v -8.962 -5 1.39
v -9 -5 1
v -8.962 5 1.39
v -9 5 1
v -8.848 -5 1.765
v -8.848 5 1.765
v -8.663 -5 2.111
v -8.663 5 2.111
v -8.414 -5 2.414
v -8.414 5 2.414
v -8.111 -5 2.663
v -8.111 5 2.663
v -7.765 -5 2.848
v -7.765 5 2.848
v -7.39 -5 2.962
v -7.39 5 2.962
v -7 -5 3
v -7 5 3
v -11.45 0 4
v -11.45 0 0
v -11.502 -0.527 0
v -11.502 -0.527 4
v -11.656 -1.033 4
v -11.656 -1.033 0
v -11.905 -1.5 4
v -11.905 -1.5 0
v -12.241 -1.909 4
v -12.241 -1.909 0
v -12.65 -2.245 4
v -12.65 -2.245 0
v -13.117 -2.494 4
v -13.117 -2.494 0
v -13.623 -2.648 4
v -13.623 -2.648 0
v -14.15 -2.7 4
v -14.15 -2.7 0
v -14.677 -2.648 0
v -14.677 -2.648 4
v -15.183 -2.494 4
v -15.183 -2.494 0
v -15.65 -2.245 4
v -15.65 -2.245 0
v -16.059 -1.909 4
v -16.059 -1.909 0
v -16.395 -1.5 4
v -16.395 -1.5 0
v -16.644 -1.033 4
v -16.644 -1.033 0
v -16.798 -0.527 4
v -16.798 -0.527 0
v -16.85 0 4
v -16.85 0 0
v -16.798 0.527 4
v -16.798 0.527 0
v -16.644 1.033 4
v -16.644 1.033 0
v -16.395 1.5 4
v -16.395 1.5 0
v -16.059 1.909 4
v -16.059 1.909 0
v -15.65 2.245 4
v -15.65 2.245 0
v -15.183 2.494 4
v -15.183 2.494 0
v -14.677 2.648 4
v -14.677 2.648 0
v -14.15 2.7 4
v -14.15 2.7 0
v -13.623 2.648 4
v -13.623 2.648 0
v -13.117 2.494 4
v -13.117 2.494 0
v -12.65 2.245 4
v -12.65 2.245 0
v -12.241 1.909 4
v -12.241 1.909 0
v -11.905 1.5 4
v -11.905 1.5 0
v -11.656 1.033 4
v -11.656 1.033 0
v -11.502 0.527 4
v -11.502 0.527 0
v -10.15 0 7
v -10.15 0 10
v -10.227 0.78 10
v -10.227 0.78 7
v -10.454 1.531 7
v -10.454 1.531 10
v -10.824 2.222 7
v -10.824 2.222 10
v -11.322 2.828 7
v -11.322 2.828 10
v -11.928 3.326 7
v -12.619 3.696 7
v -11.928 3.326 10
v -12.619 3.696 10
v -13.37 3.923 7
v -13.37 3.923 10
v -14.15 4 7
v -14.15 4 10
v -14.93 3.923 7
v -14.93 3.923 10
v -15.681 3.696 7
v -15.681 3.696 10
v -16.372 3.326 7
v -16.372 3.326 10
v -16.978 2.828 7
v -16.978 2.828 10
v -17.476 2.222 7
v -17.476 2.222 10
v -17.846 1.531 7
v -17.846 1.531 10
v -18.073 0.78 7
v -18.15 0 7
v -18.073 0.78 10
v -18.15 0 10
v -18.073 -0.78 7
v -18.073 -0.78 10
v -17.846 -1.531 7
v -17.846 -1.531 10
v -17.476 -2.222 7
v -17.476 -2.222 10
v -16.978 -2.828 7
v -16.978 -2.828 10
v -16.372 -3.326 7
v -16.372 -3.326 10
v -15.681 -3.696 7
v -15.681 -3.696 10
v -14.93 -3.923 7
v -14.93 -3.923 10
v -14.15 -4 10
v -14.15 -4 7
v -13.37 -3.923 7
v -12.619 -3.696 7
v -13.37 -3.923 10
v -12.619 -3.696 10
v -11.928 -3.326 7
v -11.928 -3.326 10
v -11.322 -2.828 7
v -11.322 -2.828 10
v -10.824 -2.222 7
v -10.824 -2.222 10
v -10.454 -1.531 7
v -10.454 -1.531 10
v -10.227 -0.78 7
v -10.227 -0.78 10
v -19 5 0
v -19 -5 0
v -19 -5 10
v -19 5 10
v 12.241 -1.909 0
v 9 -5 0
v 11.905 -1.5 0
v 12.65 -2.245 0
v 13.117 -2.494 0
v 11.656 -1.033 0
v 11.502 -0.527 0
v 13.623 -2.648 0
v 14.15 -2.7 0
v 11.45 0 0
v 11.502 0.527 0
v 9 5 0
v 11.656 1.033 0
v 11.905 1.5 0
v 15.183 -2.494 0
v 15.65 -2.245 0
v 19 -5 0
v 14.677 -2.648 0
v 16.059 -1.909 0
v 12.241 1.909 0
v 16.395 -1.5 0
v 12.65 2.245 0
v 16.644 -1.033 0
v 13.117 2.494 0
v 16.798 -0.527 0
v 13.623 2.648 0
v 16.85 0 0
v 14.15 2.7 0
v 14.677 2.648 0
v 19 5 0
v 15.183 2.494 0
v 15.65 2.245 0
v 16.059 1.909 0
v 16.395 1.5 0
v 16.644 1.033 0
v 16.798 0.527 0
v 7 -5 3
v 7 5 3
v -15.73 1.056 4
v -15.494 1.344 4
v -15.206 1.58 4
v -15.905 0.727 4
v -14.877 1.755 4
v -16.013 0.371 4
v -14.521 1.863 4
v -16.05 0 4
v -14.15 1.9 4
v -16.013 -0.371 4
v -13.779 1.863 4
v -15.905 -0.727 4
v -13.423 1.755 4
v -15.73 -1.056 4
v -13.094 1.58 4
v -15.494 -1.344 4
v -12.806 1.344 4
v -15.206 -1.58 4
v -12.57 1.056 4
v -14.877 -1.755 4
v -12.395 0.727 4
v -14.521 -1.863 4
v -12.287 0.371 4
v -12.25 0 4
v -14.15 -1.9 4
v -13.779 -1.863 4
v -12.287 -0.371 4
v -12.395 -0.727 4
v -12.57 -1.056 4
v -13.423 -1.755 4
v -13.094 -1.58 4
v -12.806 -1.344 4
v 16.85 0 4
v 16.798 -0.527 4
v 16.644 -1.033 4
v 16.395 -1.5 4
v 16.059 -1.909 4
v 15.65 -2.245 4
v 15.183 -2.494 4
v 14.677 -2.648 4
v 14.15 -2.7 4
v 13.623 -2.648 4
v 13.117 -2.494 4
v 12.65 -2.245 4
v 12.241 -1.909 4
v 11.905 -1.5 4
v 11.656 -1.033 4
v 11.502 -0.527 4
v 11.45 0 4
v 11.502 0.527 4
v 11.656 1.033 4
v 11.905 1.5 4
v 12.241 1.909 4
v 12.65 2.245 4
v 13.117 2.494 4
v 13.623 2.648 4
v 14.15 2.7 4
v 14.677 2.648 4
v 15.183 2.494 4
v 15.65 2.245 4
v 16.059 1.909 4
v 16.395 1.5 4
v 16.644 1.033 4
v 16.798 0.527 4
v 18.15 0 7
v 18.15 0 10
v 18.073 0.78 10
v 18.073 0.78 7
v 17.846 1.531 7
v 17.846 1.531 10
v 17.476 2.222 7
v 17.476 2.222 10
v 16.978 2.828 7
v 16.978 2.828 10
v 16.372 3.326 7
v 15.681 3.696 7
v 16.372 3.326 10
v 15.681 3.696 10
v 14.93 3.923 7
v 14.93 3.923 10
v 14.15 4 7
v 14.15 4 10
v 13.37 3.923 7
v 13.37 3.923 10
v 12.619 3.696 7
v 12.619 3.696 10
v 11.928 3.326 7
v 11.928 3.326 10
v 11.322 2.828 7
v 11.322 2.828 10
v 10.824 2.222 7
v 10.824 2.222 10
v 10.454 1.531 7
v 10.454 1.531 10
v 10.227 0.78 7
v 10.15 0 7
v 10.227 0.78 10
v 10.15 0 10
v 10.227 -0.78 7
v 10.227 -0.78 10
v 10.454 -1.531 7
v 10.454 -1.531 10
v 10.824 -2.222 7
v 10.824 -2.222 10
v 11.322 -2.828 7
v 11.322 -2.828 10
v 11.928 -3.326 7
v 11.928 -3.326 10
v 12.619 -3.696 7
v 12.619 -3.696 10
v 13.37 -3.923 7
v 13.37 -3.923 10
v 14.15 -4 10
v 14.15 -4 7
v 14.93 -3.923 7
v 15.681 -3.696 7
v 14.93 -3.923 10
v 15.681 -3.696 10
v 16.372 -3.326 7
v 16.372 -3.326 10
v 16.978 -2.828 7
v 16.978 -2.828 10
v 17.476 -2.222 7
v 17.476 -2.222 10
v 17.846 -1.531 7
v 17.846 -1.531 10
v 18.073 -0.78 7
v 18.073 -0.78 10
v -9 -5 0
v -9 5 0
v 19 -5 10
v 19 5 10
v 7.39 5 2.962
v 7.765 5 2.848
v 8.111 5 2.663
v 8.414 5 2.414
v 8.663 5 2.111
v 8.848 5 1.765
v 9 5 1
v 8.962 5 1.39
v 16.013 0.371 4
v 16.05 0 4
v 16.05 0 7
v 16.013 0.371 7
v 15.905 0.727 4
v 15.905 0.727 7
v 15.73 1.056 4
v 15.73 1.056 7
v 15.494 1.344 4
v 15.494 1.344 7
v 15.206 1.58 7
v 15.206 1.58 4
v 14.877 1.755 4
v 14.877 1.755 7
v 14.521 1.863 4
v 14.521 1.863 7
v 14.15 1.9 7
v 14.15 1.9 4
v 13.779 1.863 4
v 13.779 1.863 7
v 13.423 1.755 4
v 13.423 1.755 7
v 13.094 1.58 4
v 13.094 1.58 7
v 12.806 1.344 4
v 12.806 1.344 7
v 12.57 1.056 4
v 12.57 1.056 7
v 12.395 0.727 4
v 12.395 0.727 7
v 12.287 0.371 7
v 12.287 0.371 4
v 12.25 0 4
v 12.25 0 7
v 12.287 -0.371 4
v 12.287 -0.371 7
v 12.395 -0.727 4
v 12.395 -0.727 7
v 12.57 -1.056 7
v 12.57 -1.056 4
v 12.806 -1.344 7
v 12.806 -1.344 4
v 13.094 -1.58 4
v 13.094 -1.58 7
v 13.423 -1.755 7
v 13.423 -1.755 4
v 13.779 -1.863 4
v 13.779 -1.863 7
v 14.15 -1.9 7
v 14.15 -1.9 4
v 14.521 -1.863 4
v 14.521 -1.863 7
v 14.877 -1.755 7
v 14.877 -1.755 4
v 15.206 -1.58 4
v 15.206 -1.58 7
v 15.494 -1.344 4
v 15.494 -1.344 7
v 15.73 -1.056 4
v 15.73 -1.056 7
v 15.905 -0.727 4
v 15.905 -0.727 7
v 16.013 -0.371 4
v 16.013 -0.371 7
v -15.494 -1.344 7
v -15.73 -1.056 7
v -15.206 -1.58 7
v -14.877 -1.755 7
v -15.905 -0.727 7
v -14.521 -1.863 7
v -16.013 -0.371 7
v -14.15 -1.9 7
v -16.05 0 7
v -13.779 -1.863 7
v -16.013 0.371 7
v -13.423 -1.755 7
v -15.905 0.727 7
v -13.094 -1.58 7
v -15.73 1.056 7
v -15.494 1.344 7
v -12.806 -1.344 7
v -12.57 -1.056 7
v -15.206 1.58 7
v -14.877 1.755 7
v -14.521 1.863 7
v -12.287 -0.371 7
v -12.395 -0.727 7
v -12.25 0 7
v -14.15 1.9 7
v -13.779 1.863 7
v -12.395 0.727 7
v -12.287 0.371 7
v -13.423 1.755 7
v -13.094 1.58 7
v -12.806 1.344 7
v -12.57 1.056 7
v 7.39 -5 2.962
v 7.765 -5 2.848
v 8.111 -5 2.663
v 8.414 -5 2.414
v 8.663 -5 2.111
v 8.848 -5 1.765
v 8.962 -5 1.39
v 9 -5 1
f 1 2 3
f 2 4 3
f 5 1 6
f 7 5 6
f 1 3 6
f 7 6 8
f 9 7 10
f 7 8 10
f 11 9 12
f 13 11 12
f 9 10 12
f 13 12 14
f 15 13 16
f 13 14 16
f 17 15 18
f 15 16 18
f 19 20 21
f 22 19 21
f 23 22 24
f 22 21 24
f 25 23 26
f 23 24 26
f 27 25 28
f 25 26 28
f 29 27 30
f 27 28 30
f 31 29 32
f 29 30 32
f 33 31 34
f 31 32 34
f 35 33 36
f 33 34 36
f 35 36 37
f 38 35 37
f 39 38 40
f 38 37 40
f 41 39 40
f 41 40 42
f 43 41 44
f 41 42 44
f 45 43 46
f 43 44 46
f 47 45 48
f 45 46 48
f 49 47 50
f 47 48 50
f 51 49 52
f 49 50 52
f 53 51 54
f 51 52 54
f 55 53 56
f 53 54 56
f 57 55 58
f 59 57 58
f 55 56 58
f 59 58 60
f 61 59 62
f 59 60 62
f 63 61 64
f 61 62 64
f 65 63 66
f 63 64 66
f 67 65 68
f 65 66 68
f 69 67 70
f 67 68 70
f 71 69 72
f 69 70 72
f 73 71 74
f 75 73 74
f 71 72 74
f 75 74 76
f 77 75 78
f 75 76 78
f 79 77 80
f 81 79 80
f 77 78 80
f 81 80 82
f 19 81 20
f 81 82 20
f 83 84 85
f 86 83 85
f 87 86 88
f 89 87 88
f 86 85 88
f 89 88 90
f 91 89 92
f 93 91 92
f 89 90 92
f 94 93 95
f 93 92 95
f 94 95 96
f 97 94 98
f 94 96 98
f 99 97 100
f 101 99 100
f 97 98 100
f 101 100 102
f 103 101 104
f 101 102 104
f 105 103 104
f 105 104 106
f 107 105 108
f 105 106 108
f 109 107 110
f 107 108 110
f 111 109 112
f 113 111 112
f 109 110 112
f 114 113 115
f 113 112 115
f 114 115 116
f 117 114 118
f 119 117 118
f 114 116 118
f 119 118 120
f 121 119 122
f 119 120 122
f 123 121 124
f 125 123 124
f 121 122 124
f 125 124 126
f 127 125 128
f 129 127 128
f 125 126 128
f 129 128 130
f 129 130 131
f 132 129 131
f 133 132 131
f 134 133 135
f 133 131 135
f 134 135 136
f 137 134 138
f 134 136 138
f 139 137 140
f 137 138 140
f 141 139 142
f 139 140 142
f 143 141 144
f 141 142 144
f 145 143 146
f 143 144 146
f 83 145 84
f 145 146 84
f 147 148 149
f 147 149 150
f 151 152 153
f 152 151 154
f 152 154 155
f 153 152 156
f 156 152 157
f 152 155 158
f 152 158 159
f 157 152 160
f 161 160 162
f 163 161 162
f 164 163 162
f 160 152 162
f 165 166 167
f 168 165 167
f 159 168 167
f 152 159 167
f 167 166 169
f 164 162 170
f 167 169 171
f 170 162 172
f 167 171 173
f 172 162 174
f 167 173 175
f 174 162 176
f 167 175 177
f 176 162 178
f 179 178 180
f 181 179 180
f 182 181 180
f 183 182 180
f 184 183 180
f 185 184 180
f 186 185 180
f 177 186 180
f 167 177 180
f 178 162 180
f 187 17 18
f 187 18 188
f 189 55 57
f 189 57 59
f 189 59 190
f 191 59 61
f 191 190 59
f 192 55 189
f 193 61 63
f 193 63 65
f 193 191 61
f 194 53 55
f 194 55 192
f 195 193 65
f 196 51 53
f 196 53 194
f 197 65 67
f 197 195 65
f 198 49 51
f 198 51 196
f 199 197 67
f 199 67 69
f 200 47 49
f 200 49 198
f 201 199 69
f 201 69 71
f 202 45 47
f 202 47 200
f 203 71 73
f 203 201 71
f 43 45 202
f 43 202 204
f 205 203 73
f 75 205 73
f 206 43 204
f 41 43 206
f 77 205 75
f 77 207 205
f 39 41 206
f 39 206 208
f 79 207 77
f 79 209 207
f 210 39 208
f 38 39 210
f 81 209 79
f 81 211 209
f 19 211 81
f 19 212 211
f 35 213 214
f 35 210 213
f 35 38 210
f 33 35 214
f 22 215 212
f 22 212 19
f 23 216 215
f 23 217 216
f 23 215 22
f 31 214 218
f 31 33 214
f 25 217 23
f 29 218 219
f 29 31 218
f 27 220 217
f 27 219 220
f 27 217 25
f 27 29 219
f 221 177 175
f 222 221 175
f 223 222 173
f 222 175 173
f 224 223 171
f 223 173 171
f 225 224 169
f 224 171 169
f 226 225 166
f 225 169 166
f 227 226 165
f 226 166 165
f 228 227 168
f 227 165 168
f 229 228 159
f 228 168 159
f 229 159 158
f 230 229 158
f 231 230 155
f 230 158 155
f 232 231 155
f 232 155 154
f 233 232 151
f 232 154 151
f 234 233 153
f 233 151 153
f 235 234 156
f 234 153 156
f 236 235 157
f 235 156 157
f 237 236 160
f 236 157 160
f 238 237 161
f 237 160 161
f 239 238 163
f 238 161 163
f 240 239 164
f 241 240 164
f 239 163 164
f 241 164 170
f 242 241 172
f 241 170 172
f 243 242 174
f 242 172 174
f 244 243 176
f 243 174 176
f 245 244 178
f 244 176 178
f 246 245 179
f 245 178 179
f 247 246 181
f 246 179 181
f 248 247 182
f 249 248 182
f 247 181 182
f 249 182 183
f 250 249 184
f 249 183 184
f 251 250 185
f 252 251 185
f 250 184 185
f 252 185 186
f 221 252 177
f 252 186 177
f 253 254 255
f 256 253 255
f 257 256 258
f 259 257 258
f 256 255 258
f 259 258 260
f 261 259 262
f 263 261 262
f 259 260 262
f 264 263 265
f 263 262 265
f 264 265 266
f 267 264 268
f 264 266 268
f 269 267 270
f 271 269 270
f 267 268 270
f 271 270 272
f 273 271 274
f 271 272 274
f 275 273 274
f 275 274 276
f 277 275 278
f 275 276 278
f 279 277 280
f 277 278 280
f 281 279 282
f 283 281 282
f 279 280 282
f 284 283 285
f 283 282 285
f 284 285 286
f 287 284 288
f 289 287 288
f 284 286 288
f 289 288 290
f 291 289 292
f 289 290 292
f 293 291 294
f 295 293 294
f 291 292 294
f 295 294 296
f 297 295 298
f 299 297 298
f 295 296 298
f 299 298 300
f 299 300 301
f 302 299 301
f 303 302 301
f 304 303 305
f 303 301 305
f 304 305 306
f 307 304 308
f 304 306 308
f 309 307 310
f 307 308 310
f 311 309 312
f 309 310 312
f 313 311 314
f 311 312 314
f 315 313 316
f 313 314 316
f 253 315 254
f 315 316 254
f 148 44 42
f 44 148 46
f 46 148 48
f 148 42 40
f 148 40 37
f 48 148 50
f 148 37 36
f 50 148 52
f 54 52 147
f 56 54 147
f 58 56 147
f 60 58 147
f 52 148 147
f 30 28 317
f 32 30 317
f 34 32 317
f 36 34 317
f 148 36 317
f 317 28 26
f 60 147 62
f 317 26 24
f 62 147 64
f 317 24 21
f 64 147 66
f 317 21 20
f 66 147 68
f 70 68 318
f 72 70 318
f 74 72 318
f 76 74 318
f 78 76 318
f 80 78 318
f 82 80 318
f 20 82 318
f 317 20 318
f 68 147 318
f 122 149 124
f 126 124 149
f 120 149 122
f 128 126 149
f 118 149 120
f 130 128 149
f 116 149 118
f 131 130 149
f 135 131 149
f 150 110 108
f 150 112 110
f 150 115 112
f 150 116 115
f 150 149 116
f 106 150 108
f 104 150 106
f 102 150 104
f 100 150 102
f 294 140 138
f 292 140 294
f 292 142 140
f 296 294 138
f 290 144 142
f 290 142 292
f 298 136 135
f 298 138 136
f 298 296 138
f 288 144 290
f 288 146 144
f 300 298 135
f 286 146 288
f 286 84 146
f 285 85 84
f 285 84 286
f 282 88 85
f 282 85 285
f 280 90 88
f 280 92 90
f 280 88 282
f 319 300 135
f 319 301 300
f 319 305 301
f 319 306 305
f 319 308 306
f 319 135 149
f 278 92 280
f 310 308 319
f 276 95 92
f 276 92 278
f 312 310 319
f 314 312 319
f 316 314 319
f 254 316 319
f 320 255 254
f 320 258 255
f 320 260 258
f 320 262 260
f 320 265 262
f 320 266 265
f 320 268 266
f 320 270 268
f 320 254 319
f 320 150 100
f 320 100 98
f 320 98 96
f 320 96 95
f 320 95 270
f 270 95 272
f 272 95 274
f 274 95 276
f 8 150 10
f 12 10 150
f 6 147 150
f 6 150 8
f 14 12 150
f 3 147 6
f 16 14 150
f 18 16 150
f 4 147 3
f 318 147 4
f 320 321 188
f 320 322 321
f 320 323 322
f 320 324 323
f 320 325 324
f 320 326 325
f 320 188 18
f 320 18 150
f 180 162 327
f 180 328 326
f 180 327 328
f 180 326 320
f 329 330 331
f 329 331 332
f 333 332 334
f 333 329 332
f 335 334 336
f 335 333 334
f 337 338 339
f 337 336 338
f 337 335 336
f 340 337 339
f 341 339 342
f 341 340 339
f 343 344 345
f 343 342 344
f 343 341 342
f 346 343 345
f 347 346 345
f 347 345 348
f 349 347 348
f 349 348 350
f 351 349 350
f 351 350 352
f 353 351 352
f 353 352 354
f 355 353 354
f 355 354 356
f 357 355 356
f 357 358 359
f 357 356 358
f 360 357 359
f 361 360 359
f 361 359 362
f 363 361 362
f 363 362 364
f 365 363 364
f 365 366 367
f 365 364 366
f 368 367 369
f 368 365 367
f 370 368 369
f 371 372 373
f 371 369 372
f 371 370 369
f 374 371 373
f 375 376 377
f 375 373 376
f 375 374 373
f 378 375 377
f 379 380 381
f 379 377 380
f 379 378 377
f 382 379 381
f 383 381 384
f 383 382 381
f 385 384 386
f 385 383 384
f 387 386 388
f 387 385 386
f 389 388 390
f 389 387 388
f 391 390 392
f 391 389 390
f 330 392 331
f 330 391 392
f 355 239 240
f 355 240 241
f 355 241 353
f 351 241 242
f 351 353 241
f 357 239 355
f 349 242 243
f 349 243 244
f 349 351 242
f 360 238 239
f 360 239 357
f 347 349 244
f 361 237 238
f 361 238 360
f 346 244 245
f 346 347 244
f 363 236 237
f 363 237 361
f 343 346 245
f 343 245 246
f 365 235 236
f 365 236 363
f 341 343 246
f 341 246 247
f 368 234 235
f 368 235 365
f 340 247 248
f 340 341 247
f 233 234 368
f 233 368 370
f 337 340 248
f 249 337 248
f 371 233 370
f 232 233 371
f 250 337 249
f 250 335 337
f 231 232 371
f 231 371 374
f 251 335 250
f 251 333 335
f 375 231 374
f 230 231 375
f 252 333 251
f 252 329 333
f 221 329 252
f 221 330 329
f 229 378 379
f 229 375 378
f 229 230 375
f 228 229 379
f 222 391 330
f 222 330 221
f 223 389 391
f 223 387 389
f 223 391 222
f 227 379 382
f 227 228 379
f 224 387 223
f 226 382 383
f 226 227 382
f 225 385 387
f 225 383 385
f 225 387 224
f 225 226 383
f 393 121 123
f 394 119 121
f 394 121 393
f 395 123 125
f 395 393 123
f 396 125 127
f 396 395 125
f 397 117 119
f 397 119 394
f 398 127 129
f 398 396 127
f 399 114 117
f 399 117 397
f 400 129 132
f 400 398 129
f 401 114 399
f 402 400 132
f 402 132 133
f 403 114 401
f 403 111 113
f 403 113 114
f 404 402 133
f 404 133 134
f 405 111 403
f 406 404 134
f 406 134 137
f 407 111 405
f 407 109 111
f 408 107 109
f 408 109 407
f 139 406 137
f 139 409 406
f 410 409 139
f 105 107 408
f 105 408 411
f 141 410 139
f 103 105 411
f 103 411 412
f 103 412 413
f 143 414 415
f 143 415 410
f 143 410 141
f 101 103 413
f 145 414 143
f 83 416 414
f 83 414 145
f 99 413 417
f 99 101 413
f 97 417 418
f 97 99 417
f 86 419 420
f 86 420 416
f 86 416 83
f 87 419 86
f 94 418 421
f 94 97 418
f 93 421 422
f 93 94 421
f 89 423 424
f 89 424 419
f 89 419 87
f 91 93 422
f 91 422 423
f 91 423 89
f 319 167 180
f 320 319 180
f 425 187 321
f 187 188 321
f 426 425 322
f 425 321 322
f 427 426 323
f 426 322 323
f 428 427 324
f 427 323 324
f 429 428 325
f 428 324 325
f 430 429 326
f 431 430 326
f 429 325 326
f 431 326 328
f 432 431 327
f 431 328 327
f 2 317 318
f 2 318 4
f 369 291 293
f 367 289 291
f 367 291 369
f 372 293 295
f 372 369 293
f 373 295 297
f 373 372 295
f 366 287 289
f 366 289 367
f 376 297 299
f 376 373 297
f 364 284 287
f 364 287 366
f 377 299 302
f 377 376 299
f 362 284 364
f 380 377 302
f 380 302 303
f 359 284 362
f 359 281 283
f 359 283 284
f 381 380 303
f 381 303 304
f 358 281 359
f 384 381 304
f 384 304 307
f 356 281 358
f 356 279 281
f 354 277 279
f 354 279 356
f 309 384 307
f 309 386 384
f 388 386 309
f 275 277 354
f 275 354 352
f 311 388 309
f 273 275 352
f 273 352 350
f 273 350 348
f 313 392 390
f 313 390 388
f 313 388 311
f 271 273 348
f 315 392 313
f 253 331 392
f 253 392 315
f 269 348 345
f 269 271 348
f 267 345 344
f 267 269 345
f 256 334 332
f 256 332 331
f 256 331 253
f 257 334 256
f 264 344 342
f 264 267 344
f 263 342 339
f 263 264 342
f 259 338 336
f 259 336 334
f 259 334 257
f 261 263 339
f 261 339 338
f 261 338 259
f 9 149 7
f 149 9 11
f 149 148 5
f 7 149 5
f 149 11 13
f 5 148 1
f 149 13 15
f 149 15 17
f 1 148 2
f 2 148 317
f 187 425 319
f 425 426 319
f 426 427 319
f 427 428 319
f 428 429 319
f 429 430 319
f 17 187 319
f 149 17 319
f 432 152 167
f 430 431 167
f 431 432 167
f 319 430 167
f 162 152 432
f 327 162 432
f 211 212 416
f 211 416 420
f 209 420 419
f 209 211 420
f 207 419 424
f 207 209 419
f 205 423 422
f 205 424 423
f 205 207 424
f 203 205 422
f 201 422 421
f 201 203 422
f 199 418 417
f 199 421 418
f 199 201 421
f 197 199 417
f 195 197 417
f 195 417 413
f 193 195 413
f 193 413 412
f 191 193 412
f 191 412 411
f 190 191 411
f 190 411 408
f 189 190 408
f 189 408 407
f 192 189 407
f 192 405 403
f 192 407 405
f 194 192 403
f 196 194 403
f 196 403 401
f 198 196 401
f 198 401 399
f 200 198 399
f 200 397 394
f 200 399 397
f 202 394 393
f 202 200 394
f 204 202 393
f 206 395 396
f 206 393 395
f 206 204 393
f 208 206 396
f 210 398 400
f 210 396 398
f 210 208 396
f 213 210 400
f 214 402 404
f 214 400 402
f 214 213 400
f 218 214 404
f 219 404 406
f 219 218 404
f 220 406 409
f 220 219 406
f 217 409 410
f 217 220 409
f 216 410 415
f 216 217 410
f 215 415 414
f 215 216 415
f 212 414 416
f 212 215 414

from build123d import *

# Parameters (mm, degrees)
F0_W     = 38
F0_H     = 10
F0_R     = 1.9
F1_DEPTH = 10
F2_W     = 18
F2_H     = 3
F3_DEPTH = 10.001
F4_R     = 2.7
F5_DEPTH = 4
F6_R     = 2
F7_R     = 4
F8_DEPTH = 3


with BuildPart() as f1:
    # F0 (on Top) → F1 (new body)
    with BuildSketch(Plane.XY):
        Rectangle(F0_W, F0_H)
        with Locations((-14.15, 0)):
            Circle(F0_R, mode=Mode.SUBTRACT)
        with Locations((14.15, 0)):
            Circle(F0_R, mode=Mode.SUBTRACT)
    extrude(amount=F1_DEPTH)

    # F2 (on face) → F3 (cut, through all)
    with BuildSketch(Plane.XZ.offset(5)):
        with Locations((0, 1.5)):
            Rectangle(F2_W, F2_H)
    extrude(amount=-F3_DEPTH, mode=Mode.SUBTRACT)

    # F4 (on face) → F5 (cut)
    with BuildSketch(Plane(origin=(0, 0, 0), x_dir=(1, 0, 0), z_dir=(0, 0, -1))):
        with Locations((-14.15, 0)):
            Circle(F4_R)
        with Locations((14.15, 0)):
            Circle(F4_R)
    extrude(amount=-F5_DEPTH, mode=Mode.SUBTRACT)

    # F6
    f6_edges = [f1.edges().sort_by_distance(p)[0] for p in [
        (-9, 0, 3),
        (9, 0, 3),
    ]]
    fillet(f6_edges, radius=F6_R)

    # F7 (on face) → F8 (cut)
    with BuildSketch(Plane.XY.offset(10)):
        with Locations((-14.15, 0)):
            Circle(F7_R)
        with Locations((14.15, 0)):
            Circle(F7_R)
    extrude(amount=-F8_DEPTH, mode=Mode.SUBTRACT)


solid = f1.part
